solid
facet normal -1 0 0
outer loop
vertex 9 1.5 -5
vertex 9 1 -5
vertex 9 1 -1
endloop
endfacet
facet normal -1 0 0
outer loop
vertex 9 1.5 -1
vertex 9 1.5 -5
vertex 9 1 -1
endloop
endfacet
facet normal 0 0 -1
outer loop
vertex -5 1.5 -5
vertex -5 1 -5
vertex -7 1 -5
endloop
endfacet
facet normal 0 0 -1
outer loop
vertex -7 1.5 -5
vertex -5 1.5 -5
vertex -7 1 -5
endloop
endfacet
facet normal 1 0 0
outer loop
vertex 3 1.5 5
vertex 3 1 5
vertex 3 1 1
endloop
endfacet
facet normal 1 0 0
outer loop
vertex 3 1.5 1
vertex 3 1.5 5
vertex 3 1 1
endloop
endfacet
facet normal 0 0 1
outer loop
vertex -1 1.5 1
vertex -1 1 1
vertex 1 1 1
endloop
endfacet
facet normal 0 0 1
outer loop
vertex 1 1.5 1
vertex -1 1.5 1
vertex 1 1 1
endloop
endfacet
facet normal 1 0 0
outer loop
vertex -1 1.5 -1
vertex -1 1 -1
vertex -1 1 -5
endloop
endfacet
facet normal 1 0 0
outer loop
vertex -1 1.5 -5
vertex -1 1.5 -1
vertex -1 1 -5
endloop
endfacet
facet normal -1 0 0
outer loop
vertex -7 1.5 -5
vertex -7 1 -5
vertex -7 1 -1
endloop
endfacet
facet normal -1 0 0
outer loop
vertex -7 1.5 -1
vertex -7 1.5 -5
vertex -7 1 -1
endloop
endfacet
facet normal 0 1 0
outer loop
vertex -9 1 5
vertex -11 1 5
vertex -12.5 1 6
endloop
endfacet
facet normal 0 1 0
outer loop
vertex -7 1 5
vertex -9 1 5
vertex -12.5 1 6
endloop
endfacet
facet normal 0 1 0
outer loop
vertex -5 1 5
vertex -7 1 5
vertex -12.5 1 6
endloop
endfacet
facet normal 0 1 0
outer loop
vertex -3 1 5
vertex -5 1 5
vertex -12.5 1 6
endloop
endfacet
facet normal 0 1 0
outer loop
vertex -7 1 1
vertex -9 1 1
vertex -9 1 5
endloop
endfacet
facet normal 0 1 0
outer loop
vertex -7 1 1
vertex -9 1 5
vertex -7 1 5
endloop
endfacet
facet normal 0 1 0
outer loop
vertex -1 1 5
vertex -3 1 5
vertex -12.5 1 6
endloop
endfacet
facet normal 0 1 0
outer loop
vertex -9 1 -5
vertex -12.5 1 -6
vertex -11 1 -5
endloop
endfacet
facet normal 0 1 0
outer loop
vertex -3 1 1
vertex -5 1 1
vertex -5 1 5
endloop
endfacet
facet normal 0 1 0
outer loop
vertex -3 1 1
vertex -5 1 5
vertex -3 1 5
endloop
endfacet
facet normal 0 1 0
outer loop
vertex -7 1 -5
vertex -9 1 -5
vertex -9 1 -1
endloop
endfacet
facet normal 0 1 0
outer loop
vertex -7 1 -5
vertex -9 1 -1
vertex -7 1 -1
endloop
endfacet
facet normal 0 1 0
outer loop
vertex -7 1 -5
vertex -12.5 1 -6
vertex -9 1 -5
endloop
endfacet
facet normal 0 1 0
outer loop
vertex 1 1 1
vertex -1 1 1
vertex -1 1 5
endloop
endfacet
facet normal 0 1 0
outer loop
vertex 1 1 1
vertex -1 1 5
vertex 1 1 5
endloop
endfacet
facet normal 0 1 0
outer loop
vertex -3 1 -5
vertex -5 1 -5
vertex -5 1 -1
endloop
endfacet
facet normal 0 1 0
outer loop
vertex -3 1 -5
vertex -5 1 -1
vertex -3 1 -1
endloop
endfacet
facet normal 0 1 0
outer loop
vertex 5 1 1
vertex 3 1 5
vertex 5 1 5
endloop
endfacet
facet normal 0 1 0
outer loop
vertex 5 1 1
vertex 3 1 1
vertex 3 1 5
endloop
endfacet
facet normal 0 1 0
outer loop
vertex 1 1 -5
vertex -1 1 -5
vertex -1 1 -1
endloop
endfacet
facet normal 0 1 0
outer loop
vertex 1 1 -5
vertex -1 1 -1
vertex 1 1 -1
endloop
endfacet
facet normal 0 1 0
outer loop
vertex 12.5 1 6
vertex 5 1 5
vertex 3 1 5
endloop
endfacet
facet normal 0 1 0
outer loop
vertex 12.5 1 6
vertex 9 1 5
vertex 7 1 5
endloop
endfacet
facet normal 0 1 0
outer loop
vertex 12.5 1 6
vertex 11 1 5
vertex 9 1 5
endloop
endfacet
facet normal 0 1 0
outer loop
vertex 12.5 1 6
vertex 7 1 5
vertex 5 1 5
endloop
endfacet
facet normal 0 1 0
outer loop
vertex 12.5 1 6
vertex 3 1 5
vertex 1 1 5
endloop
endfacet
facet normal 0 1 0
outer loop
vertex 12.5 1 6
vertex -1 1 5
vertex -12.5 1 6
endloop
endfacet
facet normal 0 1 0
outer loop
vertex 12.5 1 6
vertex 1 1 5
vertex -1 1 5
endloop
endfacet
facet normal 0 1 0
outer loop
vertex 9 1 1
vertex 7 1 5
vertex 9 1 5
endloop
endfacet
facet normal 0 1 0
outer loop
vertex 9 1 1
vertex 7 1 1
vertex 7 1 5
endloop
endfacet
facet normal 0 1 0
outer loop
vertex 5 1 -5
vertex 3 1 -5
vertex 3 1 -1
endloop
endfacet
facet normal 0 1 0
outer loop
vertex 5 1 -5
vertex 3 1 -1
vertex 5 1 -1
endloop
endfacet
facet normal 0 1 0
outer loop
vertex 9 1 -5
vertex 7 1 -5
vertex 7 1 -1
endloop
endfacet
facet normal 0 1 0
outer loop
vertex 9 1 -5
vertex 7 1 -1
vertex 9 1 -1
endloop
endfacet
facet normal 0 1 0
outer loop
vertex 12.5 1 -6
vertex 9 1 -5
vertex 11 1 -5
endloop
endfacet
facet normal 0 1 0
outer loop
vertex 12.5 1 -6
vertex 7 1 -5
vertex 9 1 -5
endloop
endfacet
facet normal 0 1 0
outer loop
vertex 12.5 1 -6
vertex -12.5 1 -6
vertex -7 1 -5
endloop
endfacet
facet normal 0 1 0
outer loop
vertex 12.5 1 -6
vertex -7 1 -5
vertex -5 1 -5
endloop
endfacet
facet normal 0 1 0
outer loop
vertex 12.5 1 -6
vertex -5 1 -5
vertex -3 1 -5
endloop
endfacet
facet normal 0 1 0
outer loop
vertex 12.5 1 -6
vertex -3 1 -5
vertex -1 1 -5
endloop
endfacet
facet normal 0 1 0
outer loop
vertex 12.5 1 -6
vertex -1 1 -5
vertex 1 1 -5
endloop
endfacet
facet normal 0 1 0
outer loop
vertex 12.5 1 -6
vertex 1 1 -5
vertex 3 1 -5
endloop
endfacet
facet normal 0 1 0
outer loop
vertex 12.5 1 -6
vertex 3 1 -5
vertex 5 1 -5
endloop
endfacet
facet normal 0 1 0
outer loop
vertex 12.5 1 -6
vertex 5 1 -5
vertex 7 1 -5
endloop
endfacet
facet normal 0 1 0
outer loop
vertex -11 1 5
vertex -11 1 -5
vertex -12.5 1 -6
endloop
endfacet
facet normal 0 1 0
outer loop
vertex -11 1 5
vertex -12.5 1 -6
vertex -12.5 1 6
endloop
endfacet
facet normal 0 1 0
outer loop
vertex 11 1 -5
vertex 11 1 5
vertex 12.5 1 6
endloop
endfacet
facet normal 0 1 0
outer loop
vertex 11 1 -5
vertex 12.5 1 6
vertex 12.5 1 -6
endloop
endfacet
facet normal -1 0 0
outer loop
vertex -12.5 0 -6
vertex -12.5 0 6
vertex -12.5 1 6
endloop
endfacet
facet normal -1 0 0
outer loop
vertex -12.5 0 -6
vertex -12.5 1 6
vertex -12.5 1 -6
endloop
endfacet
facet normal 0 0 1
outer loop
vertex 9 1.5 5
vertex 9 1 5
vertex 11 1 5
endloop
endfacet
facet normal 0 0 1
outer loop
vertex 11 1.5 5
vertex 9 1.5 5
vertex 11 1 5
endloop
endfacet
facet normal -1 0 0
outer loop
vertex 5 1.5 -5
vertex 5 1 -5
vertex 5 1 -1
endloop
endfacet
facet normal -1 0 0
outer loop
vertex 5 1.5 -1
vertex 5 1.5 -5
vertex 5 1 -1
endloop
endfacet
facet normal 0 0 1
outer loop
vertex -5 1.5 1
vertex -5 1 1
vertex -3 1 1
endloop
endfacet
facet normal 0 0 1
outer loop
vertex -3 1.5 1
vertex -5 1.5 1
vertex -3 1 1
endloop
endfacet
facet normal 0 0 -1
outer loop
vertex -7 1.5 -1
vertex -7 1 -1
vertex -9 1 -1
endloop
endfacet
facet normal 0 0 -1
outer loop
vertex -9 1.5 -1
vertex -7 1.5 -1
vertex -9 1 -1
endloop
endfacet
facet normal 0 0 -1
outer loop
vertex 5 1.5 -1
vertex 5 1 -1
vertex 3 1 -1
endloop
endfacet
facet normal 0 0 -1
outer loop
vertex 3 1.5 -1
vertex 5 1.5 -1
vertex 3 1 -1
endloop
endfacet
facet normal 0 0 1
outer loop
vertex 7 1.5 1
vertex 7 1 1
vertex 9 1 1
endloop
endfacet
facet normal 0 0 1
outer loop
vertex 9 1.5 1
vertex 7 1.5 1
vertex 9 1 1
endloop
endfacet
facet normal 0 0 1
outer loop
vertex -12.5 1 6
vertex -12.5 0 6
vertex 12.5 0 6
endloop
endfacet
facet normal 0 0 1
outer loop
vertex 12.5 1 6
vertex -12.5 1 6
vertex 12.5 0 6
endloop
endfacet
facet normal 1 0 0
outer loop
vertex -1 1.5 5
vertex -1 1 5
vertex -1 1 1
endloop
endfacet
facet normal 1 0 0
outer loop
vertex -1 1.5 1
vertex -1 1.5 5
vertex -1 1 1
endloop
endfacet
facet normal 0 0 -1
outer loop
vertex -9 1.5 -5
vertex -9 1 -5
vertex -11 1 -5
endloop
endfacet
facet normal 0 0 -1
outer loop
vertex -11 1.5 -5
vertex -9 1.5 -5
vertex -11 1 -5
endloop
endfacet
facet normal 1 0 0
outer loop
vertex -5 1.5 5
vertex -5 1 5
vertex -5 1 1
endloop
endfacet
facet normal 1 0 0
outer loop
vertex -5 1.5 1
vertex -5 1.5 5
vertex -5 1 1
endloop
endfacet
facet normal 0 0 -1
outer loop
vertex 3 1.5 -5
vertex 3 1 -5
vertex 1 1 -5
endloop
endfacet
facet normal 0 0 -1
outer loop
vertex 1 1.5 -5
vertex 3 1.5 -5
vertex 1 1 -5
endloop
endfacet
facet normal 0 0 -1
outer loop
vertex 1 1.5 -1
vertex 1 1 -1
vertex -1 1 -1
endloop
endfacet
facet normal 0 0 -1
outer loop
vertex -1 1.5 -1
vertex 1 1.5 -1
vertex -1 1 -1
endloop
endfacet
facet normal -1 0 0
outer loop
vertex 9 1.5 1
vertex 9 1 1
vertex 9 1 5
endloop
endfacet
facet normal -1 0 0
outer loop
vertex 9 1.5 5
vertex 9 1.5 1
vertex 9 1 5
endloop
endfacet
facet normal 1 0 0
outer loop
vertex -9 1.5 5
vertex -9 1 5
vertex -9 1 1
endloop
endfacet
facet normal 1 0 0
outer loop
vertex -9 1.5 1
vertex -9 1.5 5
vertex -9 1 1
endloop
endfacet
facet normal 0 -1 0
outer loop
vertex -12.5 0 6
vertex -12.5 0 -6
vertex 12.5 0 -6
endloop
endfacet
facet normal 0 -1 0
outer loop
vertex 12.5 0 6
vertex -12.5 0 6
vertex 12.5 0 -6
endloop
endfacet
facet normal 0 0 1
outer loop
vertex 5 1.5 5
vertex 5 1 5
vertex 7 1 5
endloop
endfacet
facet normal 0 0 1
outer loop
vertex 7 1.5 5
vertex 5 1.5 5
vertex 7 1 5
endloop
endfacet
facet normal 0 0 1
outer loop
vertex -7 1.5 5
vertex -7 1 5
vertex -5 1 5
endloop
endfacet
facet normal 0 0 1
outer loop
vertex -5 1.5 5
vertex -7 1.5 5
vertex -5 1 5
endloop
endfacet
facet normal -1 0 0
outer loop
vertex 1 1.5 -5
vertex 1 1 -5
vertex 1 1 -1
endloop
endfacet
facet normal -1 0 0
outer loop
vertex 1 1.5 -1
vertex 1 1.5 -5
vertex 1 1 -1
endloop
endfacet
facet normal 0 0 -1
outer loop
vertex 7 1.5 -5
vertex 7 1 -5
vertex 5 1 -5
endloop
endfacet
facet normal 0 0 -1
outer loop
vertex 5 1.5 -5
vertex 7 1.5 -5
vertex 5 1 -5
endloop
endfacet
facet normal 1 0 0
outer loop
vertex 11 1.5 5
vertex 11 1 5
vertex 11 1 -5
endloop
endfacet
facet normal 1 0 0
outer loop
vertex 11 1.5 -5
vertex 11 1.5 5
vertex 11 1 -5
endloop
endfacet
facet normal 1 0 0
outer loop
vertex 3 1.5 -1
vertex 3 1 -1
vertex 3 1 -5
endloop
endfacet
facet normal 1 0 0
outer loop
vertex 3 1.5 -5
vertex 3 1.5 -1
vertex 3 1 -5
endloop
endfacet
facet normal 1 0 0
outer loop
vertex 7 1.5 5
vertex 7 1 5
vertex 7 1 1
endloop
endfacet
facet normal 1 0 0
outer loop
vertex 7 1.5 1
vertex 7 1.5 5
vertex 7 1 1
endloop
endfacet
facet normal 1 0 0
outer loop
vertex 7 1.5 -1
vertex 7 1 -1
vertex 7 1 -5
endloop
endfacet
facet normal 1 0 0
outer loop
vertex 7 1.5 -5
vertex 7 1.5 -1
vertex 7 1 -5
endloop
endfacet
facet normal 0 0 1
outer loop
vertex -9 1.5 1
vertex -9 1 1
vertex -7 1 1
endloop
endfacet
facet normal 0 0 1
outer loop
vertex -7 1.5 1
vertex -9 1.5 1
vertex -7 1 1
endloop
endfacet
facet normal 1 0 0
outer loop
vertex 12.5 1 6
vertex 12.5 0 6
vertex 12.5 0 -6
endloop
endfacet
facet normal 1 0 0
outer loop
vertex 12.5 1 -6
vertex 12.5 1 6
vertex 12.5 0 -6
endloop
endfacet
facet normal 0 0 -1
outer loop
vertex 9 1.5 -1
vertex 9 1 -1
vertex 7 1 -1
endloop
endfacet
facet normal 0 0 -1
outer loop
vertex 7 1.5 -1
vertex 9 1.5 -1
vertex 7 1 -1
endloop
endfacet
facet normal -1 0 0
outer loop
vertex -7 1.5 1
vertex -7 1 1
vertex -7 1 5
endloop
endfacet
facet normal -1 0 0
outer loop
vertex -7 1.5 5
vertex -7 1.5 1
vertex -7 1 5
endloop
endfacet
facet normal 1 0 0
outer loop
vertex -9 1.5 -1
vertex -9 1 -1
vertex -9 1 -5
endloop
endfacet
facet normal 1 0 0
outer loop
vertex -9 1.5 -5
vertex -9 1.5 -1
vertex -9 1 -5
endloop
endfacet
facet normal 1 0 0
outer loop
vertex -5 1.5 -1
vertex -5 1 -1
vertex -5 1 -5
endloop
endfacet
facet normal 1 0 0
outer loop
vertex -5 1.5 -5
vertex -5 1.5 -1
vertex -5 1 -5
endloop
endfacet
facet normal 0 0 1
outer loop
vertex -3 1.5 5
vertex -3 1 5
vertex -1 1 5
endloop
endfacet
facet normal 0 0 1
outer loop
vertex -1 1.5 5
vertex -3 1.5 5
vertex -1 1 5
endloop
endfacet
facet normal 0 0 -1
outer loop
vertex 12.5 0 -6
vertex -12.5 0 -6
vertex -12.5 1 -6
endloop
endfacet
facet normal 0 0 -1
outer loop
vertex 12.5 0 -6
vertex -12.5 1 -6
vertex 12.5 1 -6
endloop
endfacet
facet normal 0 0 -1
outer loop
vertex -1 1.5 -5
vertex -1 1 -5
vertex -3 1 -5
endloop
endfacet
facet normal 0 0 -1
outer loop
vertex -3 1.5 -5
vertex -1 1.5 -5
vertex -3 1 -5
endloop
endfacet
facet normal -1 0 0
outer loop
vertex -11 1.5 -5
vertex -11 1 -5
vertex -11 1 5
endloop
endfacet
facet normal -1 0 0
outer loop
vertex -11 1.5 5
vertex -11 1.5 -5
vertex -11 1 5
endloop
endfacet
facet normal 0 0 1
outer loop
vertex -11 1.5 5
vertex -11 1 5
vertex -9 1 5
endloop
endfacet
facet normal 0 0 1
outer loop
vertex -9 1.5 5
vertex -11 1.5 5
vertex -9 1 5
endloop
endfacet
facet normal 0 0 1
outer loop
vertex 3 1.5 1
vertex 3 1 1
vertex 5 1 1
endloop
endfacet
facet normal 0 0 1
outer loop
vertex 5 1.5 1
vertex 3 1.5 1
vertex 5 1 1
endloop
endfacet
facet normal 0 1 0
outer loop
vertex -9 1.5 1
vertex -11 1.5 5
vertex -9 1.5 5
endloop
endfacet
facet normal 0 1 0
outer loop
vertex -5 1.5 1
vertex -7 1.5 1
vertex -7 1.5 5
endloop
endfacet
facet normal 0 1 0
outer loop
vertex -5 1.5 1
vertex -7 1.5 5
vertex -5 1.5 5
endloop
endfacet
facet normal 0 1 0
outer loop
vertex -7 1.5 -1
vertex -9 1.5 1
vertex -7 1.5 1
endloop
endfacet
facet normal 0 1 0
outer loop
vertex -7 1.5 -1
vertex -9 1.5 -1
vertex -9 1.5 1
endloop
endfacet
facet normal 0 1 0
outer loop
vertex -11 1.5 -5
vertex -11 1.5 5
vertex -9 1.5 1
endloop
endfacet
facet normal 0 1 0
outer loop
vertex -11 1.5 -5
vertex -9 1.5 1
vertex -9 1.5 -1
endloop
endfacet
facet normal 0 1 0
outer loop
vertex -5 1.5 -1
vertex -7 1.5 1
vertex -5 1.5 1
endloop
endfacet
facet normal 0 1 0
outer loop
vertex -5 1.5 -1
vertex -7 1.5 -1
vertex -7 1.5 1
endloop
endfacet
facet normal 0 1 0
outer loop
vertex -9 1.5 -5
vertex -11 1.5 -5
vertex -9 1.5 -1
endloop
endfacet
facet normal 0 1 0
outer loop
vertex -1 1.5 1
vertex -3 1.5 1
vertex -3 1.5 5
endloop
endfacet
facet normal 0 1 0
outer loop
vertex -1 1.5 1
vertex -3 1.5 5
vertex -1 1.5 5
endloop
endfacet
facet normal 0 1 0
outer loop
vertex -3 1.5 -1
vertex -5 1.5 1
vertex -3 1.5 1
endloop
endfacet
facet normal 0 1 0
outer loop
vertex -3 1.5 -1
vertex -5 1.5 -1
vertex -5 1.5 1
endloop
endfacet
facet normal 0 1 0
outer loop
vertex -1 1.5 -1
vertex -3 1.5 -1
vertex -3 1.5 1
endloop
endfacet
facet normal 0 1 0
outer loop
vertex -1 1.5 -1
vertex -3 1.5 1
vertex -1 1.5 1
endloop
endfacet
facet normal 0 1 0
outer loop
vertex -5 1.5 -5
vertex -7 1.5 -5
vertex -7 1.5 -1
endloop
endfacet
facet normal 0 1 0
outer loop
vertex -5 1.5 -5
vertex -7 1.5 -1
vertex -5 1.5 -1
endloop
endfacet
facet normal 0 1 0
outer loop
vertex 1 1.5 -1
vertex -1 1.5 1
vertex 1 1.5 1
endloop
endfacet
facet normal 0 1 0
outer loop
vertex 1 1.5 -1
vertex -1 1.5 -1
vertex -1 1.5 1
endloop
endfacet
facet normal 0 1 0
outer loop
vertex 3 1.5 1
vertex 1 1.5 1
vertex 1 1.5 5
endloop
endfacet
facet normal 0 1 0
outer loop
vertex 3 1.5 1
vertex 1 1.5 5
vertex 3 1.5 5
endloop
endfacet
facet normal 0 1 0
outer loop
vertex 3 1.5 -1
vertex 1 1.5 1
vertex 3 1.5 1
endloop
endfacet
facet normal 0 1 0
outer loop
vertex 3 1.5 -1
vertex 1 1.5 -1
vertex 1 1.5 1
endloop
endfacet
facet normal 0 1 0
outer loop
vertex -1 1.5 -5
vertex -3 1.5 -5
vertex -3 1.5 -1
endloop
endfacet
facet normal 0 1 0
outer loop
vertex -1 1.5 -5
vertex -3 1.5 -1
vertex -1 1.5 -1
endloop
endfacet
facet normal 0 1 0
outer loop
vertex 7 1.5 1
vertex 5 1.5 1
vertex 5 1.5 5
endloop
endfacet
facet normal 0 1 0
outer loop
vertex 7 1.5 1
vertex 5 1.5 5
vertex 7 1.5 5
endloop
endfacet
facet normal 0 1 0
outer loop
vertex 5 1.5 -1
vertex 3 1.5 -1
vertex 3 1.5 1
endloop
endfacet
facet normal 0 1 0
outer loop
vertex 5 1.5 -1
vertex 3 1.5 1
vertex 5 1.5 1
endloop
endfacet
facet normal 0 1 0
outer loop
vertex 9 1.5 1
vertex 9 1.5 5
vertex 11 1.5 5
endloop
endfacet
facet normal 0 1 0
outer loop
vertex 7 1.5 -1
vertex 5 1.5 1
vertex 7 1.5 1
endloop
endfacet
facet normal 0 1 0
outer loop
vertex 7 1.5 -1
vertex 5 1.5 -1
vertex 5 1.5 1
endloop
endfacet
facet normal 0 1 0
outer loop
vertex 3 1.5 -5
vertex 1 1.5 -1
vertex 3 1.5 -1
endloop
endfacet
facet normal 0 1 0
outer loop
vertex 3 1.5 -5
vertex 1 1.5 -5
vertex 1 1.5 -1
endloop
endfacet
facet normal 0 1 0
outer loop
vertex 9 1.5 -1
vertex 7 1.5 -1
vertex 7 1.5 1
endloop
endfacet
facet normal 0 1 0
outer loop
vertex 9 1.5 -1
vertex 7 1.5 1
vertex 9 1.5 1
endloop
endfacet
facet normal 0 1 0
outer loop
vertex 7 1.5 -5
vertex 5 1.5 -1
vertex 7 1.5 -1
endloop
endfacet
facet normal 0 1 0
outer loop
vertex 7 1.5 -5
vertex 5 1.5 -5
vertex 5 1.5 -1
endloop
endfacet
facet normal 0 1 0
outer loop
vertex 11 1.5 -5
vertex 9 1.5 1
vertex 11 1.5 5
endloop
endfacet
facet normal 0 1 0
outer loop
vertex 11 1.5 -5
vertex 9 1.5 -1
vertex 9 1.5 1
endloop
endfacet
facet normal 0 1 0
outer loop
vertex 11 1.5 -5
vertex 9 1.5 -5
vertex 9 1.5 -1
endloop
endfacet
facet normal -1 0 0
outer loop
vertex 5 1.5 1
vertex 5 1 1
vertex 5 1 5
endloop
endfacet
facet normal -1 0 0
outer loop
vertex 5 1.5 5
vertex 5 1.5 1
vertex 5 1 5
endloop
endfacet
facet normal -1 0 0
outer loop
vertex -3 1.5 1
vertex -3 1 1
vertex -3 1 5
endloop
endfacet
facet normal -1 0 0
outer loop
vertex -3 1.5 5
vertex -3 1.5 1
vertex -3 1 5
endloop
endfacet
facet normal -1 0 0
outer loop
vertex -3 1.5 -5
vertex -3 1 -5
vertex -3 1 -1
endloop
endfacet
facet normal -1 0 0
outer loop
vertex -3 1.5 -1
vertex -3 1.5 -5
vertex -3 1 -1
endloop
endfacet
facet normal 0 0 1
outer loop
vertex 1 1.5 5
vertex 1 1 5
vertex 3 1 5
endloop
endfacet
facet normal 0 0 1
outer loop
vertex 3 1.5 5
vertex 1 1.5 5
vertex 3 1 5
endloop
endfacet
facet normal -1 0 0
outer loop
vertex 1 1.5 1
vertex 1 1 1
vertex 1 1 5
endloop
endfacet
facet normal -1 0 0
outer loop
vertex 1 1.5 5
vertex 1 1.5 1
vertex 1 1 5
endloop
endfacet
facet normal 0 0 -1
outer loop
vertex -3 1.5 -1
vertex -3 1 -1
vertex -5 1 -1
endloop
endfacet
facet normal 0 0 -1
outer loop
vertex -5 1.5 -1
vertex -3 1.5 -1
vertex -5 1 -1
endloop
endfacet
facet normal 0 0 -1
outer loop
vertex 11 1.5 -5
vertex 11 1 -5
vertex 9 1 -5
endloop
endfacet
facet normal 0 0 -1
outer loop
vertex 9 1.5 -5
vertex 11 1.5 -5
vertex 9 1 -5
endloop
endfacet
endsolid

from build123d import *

# Parameters (mm, degrees)
SKETCH1_W           = 25
SKETCH1_H           = 12
BOSS_EXTRUDE1_DEPTH = 1
WRAP1_DEPTH         = 0.5


# Read off the part's stored shape, not the designer's step: Wrap1
with BuildPart() as part:
    # Sketch1 → Boss-Extrude1 (new body)
    with BuildSketch(Plane(origin=(0, 0, 0), x_dir=(1, 0, 0), z_dir=(0, 1, 0))):
        Rectangle(SKETCH1_W, SKETCH1_H)
    extrude(amount=BOSS_EXTRUDE1_DEPTH)

    # Wrap1 outline → Wrap1 (add)
    with BuildSketch(Plane(origin=(0, 1, 0), x_dir=(1, 0, 0), z_dir=(0, 1, 0))):
        Polygon((-11, -5), (-9, -5), (-9, -1), (-7, -1), (-7, -5), (-5, -5), (-5, -1), (-3, -1), (-3, -5), (-1, -5), (-1, -1), (1, -1), (1, -5), (3, -5), (3, -1), (5, -1), (5, -5), (7, -5), (7, -1), (9, -1), (9, -5), (11, -5), (11, 5), (9, 5), (9, 1), (7, 1), (7, 5), (5, 5), (5, 1), (3, 1), (3, 5), (1, 5), (1, 1), (-1, 1), (-1, 5), (-3, 5), (-3, 1), (-5, 1), (-5, 5), (-7, 5), (-7, 1), (-9, 1), (-9, 5), (-11, 5), align=None)
    extrude(amount=WRAP1_DEPTH)


solid = part.part
